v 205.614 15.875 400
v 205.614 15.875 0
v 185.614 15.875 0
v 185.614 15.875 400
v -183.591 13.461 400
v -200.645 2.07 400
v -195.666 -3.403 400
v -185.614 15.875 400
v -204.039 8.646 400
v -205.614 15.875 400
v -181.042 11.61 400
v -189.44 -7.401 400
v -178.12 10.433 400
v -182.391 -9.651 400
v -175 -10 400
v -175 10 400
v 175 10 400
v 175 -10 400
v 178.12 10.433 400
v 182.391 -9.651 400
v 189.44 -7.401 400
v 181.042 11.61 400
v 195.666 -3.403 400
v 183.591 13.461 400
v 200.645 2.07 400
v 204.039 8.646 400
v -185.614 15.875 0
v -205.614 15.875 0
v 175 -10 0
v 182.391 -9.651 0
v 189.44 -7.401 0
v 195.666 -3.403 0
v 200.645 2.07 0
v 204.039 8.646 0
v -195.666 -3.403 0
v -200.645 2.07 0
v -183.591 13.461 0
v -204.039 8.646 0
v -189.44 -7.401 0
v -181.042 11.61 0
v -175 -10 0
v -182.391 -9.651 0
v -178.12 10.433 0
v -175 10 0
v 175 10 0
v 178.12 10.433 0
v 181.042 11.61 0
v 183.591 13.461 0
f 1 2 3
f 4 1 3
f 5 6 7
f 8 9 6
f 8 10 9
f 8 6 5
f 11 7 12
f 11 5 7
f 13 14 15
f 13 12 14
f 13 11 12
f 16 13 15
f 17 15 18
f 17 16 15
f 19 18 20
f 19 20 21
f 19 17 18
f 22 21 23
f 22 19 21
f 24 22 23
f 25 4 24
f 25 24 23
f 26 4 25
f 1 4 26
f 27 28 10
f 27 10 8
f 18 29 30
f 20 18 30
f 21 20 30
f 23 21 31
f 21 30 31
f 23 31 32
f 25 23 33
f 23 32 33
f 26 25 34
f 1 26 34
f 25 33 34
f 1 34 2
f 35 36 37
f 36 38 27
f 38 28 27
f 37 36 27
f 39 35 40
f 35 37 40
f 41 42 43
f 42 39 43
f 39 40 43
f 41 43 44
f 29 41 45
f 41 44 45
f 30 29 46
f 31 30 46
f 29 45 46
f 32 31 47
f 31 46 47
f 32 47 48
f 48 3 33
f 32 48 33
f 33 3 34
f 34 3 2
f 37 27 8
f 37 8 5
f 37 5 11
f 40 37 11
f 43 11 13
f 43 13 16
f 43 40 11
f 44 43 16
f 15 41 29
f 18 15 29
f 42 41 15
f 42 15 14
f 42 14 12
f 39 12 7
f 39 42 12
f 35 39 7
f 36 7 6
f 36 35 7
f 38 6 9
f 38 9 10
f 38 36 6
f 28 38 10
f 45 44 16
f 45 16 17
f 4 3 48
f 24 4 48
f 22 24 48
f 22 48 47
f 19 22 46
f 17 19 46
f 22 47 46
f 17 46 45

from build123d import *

# Parameters (mm, degrees)
SKETCH1_W           = 350
SKETCH1_H           = 20
BOSS_EXTRUDE1_DEPTH = 400
BOSS_EXTRUDE2_DEPTH = 400


with BuildPart() as part:
    # Sketch1 → Boss-Extrude1 (new body)
    with BuildSketch(Plane.XY):
        Rectangle(SKETCH1_W, SKETCH1_H)
    extrude(amount=BOSS_EXTRUDE1_DEPTH)

    # Sketch2 → Boss-Extrude2 (add)
    with BuildSketch(Plane.XY):
        with BuildLine():
            Line((-175, 10), (-175, -10))
            ThreePointArc((-175, -10), (-195.66613877, -3.40269315), (-205.614305224, 15.875474127))
            Line((-205.614305224, 15.875474127), (-185.614305224, 15.875474127))
            ThreePointArc((-185.614305224, 15.875474127), (-181.041918581, 11.610349673), (-175, 10))
        make_face()
    boss_extrude2 = extrude(amount=BOSS_EXTRUDE2_DEPTH)

    # Mirror1: Boss-Extrude2 across plane
    add(boss_extrude2.mirror(Plane(origin=(0, 0, 0), x_dir=(0, 0, 1), z_dir=(1, 0, 0))))


solid = part.part
